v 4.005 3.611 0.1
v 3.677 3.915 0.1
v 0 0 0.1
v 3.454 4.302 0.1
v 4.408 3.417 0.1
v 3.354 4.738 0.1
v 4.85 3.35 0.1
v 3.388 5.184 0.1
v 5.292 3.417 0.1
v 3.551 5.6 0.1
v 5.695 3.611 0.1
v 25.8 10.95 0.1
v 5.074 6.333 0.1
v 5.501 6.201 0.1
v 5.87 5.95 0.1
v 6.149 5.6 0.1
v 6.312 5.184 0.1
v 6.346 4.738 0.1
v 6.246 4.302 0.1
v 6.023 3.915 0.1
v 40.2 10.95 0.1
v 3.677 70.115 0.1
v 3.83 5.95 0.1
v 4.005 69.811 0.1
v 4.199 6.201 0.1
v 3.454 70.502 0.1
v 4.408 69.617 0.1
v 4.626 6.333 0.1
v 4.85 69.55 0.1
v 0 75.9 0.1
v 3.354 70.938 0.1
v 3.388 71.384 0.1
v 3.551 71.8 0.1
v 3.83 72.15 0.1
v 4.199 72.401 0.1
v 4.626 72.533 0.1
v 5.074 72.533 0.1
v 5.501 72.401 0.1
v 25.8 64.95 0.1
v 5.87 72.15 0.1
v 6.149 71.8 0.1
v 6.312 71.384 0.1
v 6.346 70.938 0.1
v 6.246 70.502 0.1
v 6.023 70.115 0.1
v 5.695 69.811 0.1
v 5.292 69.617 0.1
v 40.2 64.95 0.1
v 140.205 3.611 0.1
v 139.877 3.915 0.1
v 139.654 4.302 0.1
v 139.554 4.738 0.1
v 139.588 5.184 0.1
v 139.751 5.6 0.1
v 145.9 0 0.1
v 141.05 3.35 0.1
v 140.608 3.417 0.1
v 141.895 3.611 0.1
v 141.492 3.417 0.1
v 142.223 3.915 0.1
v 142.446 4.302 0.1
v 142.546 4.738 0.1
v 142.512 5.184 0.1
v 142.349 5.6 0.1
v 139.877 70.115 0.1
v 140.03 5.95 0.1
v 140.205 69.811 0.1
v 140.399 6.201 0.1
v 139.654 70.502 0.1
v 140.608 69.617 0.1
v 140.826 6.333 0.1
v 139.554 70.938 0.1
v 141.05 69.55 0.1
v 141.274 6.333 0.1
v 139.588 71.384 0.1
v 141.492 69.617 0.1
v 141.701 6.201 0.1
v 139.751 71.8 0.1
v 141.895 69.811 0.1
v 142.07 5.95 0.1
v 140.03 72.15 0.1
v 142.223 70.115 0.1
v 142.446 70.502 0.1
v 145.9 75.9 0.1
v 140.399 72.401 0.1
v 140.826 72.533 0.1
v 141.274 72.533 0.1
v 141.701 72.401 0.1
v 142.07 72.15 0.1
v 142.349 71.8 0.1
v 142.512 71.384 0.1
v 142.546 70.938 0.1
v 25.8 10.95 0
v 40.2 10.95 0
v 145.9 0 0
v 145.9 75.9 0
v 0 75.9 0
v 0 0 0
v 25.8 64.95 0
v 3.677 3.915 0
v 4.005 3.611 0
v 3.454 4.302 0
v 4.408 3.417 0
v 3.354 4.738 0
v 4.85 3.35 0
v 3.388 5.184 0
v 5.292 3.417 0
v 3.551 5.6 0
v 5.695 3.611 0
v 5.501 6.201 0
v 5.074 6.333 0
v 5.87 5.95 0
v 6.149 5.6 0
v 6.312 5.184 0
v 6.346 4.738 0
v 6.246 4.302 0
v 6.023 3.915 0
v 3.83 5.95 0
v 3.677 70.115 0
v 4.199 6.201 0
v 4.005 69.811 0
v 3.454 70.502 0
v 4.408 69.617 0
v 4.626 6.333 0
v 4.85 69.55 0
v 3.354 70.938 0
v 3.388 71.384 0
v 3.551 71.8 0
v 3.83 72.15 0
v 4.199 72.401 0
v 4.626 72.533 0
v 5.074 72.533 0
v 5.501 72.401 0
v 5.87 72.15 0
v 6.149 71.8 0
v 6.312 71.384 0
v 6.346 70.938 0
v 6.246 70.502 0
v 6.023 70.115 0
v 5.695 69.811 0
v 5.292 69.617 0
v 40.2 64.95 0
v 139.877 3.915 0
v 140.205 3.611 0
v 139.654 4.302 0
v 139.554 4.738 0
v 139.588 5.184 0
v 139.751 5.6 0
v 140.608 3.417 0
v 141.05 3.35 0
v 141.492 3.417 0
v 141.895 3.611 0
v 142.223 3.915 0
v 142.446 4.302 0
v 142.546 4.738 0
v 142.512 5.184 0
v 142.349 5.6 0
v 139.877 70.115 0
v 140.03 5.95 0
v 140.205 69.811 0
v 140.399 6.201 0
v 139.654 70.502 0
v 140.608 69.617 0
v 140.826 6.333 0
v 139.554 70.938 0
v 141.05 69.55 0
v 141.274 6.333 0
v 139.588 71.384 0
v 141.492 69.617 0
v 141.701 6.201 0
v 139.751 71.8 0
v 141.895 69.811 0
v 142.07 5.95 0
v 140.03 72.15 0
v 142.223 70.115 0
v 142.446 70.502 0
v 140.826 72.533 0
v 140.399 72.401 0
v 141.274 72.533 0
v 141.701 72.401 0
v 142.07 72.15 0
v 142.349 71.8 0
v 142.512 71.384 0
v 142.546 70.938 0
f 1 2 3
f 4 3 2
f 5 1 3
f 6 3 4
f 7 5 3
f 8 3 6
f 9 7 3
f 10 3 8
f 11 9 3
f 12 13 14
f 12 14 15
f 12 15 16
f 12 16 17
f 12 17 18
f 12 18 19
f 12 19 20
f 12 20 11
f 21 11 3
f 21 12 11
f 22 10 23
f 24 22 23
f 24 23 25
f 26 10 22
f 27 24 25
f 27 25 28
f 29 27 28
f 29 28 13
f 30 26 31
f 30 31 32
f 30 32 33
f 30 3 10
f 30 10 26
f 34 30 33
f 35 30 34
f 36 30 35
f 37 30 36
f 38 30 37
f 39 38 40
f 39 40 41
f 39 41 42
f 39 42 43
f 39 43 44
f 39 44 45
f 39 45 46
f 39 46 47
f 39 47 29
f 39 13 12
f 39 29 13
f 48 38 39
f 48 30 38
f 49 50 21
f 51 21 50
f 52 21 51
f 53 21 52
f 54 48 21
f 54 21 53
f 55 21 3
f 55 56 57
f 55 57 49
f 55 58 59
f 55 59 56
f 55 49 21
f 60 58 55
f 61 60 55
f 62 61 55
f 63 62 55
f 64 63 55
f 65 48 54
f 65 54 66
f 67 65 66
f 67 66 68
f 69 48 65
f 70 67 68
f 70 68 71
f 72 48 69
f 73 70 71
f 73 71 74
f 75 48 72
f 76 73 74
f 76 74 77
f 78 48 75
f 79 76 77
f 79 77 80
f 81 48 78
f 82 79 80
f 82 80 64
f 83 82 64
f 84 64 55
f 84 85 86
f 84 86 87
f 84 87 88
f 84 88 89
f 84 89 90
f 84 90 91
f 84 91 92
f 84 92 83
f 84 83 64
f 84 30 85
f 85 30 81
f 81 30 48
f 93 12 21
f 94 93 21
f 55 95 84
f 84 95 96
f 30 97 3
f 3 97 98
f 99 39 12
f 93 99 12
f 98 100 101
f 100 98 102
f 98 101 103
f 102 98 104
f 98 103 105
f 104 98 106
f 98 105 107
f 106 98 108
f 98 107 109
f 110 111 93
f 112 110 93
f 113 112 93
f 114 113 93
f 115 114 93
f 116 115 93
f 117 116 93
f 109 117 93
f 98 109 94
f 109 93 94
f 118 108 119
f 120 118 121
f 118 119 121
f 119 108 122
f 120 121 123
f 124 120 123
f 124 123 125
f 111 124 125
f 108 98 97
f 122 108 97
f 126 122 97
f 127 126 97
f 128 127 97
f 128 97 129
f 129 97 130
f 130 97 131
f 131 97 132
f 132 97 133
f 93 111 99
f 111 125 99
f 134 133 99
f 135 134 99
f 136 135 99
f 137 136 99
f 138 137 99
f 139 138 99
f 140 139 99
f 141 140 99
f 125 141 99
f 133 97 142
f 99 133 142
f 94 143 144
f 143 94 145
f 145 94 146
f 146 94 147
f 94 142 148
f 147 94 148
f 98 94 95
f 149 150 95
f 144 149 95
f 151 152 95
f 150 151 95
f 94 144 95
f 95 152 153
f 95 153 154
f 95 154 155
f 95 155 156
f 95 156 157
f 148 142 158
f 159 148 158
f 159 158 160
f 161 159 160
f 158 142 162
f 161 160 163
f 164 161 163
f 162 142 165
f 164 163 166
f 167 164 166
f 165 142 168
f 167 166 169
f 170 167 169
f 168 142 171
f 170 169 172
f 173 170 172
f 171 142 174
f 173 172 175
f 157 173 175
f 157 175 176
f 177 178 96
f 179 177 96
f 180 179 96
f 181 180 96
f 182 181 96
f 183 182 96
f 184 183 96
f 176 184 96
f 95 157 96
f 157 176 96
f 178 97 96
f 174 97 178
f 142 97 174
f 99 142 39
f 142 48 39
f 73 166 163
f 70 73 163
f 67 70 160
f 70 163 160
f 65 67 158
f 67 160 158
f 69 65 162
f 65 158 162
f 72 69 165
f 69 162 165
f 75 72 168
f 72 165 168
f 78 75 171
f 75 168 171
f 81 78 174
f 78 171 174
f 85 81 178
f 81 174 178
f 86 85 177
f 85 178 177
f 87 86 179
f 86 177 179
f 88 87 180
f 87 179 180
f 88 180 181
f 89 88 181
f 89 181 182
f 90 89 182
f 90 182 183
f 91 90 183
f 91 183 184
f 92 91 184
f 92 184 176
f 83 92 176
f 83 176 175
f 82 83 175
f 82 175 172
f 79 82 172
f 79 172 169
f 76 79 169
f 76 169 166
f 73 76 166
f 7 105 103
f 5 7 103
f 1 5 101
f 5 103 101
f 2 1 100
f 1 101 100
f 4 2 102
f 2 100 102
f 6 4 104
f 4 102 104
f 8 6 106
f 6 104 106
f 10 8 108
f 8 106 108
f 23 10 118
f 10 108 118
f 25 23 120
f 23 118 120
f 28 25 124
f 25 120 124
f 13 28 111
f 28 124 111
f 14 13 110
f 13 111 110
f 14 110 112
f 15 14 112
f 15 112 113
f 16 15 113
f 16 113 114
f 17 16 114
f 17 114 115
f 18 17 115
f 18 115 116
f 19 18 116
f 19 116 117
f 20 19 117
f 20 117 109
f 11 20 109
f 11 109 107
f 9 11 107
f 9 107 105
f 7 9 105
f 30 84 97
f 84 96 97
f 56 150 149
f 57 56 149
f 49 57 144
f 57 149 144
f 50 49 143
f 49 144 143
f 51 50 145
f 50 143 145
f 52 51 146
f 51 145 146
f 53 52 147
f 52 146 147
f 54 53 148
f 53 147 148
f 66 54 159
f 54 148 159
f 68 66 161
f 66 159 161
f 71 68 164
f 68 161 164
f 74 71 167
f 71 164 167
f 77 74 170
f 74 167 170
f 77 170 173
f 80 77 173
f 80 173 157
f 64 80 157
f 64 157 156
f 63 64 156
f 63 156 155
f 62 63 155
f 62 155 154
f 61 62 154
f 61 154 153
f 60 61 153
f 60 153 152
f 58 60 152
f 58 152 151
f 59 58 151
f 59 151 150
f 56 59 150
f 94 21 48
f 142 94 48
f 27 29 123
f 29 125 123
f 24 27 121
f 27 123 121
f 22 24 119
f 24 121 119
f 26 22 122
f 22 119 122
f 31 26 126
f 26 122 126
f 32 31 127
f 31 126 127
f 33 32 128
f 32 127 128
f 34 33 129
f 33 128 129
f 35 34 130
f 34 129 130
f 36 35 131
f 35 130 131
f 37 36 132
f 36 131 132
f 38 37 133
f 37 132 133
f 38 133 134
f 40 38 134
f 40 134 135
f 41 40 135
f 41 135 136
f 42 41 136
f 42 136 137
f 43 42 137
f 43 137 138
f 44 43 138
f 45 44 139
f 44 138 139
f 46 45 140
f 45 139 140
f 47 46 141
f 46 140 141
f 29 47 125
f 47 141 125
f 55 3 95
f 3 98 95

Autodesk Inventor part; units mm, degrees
ref_plane "YZ Plane" through (0, 0, 0) normal (1, 0, 0) x (0, 1, 0)
ref_plane "XZ Plane" through (0, 0, 0) normal (0, 1, 0) x (-1, 0, 0)
ref_plane "XY Plane" through (0, 0, 0) normal (0, 0, 1) x (1, 0, 0)
sketch "Sketch1" plane through (0, 0, 0) normal (0, 0, 1) x (1, 0, 0)
  line L0 (0, 0) -> (145.9, 0)
  line L1 (145.9, 0) -> (145.9, 75.9)
  line L2 (145.9, 75.9) -> (0, 75.9)
  line L3 (0, 75.9) -> (0, 0)
  dimension "d0" = 145.9
  dimension "d1" = 75.9
extrude "Extrusion1" add sketch "Sketch1" along normal blind 0.1
sketch "Sketch2" plane through (0, 0, 0.1) normal (0, 0, 1) x (1, 0, 0)
  line L0 (0, 0) -> (145.9, 0) construction
  line L1 (145.9, 0) -> (145.9, 75.9) construction
  line L2 (145.9, 75.9) -> (0, 75.9) construction
  line L3 (0, 75.9) -> (0, 0) construction
  line L4 (141.05, 4.85) -> (4.85, 4.85) construction
  line L5 (4.85, 4.85) -> (4.85, 71.05) construction
  line L6 (4.85, 71.05) -> (141.05, 71.05) construction
  line L7 (141.05, 71.05) -> (141.05, 4.85) construction
  dimension "d4" = 4.85
hole "Hole1" at (4.85, 71.05, 0.1) at (4.85, 4.85, 0.1) at (141.05, 4.85, 0.1) at (141.05, 71.05, 0.1) direction (0, 0, -1) diameter 3 end through all
sketch "Sketch3" plane through (0, 0, 0.1) normal (0, 0, 1) x (1, 0, 0)
  line L0 (25.8, 10.95) -> (40.2, 10.95)
  line L1 (40.2, 10.95) -> (40.2, 64.95)
  line L2 (40.2, 64.95) -> (25.8, 64.95)
  line L3 (25.8, 64.95) -> (25.8, 10.95)
  circle A0 centre (141.05, 4.85) radius 1.5 construction
  circle A1 centre (4.85, 71.05) radius 1.5 construction
  circle A2 centre (4.85, 4.85) radius 1.5 construction
  circle A3 centre (141.05, 71.05) radius 1.5 construction
  line L4 (0, 0) -> (145.9, 0) construction
  line L5 (145.9, 0) -> (145.9, 75.9) construction
  line L6 (145.9, 75.9) -> (0, 75.9) construction
  line L7 (0, 75.9) -> (0, 0) construction
  dimension "d20" = 105.7
  dimension "d21" = 14.4
  dimension "d22" = 54
  dimension "d23" = 10.95
extrude "Extrusion2" cut sketch "Sketch3" against normal up to next
properties part number "Paper Sheet" material "Paper"
